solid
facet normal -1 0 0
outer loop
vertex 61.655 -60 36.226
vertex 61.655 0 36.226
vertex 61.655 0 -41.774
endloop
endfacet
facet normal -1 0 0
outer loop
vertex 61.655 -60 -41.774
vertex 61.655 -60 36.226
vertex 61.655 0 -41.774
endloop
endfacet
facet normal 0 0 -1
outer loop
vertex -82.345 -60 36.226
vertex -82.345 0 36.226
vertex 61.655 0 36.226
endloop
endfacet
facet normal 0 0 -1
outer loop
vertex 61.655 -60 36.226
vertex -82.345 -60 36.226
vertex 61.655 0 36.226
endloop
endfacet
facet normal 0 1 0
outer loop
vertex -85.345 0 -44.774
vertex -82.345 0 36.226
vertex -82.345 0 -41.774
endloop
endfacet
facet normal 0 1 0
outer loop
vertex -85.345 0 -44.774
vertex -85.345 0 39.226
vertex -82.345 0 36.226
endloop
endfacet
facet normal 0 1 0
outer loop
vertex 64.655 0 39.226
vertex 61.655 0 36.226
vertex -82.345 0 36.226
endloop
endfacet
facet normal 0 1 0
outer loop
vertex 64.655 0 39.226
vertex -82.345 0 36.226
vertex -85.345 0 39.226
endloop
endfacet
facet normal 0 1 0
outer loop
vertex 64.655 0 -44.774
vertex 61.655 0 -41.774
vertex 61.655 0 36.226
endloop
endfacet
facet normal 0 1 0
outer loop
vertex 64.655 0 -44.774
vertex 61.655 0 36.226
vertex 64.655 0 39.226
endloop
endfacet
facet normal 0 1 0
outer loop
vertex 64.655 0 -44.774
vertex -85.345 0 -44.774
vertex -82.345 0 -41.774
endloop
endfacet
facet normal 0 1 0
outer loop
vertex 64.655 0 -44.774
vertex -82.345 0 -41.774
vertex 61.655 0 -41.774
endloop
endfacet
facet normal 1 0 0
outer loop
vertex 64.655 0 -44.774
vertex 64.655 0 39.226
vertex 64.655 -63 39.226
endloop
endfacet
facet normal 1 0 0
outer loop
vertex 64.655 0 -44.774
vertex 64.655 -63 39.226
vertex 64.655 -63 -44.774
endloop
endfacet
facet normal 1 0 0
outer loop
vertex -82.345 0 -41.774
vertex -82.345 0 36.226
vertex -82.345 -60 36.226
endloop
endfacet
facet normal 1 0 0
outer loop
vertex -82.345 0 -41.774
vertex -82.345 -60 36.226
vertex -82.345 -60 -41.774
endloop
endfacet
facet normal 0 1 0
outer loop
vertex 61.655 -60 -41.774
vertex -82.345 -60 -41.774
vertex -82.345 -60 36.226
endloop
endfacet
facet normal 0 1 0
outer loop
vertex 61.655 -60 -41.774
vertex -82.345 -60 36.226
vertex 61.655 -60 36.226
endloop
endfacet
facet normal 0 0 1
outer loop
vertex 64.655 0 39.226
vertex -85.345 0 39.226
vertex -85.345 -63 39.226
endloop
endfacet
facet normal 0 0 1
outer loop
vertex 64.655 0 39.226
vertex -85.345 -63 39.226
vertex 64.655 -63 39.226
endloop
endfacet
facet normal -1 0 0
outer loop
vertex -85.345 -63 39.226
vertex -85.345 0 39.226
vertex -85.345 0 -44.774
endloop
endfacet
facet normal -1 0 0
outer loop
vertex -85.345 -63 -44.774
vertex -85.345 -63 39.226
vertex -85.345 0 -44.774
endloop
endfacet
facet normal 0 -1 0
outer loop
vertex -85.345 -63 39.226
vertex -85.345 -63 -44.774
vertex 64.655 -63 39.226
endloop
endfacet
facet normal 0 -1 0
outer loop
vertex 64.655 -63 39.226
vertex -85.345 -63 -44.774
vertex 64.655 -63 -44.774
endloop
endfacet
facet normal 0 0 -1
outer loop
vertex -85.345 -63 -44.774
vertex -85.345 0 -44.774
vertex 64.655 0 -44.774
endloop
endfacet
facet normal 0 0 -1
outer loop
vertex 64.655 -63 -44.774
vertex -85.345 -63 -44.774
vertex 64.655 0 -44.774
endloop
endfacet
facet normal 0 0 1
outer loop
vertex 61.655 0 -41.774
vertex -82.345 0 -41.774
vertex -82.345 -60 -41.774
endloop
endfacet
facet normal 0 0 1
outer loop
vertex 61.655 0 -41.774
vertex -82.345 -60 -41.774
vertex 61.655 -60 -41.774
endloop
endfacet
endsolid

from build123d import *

# Parameters (mm, degrees)
SKETCH1_W           = 150
SKETCH1_H           = 84
BOSS_EXTRUDE1_DEPTH = 63
SHELL1_T            = -3


with BuildPart() as part:
    # Sketch1 → Boss-Extrude1 (new body)
    with BuildSketch(Plane(origin=(0, 0, 0), x_dir=(1, 0, 0), z_dir=(0, 1, 0))):
        with Locations((-10.344827586, 2.773706897)):
            Rectangle(SKETCH1_W, SKETCH1_H)
    extrude(amount=-BOSS_EXTRUDE1_DEPTH)

    # Shell1
    shell1_openings = [part.faces().sort_by_distance(p)[0] for p in [
        (-10.344827586, 0, -2.773706897),
    ]]
    offset(amount=SHELL1_T, openings=shell1_openings, kind=Kind.INTERSECTION)


solid = part.part
